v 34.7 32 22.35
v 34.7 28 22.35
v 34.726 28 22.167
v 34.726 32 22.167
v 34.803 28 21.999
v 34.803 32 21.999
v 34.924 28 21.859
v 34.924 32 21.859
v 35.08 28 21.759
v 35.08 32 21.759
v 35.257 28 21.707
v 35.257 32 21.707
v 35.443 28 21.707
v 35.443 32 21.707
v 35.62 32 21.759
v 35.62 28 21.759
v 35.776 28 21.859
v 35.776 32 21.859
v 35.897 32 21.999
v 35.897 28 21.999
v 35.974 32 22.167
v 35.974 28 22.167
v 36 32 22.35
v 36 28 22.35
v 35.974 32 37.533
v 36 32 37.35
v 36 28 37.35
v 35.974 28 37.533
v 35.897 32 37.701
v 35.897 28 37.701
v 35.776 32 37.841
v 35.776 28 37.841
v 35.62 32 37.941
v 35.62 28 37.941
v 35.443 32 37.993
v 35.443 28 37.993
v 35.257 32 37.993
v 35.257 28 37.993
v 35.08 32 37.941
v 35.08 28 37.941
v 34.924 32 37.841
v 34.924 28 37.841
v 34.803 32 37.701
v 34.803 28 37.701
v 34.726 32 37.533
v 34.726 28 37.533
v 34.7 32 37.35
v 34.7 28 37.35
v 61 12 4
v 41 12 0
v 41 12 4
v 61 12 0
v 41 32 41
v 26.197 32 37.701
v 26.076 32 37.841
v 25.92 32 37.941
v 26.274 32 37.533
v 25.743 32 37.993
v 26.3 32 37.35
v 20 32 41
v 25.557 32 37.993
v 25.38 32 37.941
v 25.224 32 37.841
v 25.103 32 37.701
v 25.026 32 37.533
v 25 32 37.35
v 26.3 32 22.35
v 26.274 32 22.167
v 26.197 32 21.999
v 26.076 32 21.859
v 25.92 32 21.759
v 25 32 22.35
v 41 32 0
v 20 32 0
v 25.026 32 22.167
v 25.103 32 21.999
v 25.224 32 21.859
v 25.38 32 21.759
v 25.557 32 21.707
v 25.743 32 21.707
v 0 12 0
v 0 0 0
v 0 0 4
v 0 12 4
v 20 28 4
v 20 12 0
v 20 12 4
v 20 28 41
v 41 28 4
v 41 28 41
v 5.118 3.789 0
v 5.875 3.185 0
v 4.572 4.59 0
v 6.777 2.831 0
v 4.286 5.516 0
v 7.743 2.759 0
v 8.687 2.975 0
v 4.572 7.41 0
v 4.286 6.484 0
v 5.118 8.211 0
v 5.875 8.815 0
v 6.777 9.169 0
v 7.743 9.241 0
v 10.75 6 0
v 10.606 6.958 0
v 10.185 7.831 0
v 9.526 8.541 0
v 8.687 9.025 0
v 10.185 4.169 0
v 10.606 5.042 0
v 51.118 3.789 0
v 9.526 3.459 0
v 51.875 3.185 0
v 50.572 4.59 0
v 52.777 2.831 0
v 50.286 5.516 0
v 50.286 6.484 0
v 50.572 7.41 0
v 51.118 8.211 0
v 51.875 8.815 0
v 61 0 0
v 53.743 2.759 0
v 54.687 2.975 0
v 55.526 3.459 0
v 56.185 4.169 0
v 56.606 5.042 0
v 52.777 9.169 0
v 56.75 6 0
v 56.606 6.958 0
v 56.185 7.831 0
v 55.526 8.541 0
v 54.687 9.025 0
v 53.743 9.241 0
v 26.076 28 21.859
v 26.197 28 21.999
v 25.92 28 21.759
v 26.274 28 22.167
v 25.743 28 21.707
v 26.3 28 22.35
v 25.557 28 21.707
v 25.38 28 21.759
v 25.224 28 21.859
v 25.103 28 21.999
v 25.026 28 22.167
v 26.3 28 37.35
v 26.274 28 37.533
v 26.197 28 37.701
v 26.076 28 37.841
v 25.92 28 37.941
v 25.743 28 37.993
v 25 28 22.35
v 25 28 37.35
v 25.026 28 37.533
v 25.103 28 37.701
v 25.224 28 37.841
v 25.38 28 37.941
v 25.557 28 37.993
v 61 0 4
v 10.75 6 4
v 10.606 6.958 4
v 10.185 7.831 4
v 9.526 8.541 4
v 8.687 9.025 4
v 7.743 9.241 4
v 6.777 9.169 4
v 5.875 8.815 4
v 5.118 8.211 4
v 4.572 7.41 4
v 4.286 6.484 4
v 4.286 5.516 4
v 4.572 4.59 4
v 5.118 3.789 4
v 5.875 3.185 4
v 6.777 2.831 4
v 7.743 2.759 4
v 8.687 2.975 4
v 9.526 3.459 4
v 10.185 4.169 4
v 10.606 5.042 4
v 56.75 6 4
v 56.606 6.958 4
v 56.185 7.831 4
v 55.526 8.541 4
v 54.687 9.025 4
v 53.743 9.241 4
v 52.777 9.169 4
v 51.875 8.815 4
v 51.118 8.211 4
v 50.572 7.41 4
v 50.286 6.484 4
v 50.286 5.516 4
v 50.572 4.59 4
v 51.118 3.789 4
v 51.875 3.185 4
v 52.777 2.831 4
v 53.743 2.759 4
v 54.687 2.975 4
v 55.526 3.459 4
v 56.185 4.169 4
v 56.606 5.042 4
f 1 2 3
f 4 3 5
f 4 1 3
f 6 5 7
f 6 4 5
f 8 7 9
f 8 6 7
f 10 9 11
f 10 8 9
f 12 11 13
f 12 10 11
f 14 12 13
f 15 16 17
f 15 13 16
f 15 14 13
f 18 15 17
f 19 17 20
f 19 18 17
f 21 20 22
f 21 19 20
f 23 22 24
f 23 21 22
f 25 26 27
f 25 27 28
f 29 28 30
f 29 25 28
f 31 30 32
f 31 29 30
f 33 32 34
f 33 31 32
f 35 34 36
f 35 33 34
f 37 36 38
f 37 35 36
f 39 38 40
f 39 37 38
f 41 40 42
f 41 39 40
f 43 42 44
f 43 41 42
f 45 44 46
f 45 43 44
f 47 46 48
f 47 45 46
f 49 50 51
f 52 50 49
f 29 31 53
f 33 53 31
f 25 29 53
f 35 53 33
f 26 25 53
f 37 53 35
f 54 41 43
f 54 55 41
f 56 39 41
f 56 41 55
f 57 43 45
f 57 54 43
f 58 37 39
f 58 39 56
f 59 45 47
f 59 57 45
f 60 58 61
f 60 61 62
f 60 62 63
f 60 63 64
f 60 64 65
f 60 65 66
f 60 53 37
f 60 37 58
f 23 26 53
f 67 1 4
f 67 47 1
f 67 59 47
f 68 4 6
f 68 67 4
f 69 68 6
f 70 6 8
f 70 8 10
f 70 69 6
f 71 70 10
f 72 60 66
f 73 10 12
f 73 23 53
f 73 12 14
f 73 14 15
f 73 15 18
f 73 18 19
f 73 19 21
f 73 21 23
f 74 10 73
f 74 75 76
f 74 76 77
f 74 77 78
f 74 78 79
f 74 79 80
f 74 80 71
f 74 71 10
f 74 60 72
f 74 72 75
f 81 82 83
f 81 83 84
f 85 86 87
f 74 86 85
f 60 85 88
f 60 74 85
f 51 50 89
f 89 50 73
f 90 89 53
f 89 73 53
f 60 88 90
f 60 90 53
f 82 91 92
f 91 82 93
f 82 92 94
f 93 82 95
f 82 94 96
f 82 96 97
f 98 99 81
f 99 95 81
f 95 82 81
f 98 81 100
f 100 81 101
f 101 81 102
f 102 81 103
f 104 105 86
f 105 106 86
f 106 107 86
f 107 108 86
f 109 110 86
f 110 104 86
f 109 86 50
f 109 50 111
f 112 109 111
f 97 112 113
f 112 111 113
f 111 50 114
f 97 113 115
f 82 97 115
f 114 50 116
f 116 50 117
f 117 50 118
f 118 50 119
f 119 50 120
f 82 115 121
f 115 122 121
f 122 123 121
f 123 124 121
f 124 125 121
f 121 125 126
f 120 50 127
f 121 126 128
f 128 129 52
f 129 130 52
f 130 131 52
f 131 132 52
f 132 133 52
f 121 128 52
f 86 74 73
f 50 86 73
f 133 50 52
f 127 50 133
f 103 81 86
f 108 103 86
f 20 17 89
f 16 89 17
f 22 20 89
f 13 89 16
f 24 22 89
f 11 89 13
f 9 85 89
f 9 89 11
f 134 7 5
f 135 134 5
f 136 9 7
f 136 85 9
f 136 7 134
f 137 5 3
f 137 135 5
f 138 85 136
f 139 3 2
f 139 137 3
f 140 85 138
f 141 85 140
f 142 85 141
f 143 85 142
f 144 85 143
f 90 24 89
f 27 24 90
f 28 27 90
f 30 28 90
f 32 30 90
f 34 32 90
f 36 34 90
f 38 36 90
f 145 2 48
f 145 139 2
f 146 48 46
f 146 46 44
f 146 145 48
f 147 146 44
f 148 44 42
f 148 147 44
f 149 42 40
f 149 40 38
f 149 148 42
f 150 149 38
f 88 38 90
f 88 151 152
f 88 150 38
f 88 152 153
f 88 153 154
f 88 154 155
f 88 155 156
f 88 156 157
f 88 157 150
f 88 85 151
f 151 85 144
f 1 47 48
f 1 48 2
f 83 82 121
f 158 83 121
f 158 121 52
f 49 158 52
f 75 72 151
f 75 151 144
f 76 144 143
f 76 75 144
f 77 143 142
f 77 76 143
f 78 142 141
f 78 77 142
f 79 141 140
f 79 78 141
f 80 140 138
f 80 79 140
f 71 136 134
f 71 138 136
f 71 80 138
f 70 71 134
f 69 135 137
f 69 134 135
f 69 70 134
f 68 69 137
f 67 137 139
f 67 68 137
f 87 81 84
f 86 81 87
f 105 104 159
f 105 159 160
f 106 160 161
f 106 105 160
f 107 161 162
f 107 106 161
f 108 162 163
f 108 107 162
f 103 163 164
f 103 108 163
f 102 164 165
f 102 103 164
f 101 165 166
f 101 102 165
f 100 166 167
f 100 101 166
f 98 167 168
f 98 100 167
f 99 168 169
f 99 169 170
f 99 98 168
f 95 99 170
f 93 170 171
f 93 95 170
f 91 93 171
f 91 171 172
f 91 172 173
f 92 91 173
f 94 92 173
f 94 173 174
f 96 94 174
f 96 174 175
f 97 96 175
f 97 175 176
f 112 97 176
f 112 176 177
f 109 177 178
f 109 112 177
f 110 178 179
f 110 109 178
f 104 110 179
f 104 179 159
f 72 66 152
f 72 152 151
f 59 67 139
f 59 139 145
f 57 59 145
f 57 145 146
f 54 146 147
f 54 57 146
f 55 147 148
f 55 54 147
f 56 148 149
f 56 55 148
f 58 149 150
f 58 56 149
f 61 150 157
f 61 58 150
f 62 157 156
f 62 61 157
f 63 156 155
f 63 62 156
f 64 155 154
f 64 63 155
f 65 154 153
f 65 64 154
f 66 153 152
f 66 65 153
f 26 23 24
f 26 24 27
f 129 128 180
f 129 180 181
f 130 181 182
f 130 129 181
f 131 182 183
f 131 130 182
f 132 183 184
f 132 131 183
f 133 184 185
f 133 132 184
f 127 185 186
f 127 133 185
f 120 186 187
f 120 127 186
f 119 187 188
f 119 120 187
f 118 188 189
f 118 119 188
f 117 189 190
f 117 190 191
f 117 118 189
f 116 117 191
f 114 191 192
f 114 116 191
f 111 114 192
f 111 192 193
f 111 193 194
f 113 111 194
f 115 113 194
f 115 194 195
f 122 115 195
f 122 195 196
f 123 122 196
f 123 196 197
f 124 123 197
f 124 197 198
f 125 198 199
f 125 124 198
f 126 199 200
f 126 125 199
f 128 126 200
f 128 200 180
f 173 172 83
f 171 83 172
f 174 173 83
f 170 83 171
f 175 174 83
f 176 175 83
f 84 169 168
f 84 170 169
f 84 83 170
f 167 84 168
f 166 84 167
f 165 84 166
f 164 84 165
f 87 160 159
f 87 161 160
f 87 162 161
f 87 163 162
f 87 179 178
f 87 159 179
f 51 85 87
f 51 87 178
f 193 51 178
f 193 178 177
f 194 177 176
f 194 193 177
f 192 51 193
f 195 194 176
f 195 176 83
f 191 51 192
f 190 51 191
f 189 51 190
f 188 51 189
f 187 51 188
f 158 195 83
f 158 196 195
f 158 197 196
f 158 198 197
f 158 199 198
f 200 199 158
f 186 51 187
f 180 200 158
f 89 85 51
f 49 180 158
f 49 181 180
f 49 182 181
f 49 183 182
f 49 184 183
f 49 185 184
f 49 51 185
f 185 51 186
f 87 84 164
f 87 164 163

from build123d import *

# Parameters (mm, degrees)
SKETCH1_W           = 61
SKETCH1_H           = 12
SKETCH1_R           = 3.25
BOSS_EXTRUDE1_DEPTH = 4
BOSS_EXTRUDE2_START = -20
BOSS_EXTRUDE2_DEPTH = 21
CUT_EXTRUDE1_REACH  = 82.162


with BuildPart() as part:
    # Sketch1 → Boss-Extrude1 (new body)
    with BuildSketch(Plane.XY):
        with Locations((30.5, 6)):
            Rectangle(SKETCH1_W, SKETCH1_H)
        with Locations((7.5, 6)):
            Circle(SKETCH1_R, mode=Mode.SUBTRACT)
        with Locations((53.5, 6)):
            Circle(SKETCH1_R, mode=Mode.SUBTRACT)
    extrude(amount=BOSS_EXTRUDE1_DEPTH)

    # Sketch3 → Boss-Extrude2 (add)
    with BuildSketch(Plane.ZY.offset(BOSS_EXTRUDE2_START)):
        Polygon((4, 12), (4, 28), (41, 28), (41, 32), (0, 32), (0, 12), align=None)
    extrude(amount=-BOSS_EXTRUDE2_DEPTH)

    # Sketch4 → Cut-Extrude1 (cut, up to next)
    with BuildSketch(Plane(origin=(0, 32, 0), x_dir=(1, 0, 0), z_dir=(0, 1, 0)), mode=Mode.PRIVATE) as cut_extrude1_sk1:
        with BuildLine():
            Line((36, -22.35), (36, -37.35))
            ThreePointArc((36, -37.35), (35.35, -38), (34.7, -37.35))
            Line((34.7, -37.35), (34.7, -22.35))
            ThreePointArc((34.7, -22.35), (35.35, -21.7), (36, -22.35))
        make_face()
    cut_extrude1_tool1 = extrude(cut_extrude1_sk1.sketch, amount=-CUT_EXTRUDE1_REACH, mode=Mode.PRIVATE) & part.part
    # Sketch4 → Cut-Extrude1 (cut, up to next)
    with BuildSketch(Plane(origin=(0, 32, 0), x_dir=(1, 0, 0), z_dir=(0, 1, 0)), mode=Mode.PRIVATE) as cut_extrude1_sk2:
        with BuildLine():
            Line((26.3, -22.35), (26.3, -37.35))
            ThreePointArc((26.3, -37.35), (25.65, -38), (25, -37.35))
            Line((25, -37.35), (25, -22.35))
            ThreePointArc((25, -22.35), (25.65, -21.7), (26.3, -22.35))
        make_face()
    cut_extrude1_tool2 = extrude(cut_extrude1_sk2.sketch, amount=-CUT_EXTRUDE1_REACH, mode=Mode.PRIVATE) & part.part
    add(cut_extrude1_tool1.solids().sort_by_distance((35.35, 32, 29.85))[0], mode=Mode.SUBTRACT)
    add(cut_extrude1_tool2.solids().sort_by_distance((25.65, 32, 29.85))[0], mode=Mode.SUBTRACT)


solid = part.part
